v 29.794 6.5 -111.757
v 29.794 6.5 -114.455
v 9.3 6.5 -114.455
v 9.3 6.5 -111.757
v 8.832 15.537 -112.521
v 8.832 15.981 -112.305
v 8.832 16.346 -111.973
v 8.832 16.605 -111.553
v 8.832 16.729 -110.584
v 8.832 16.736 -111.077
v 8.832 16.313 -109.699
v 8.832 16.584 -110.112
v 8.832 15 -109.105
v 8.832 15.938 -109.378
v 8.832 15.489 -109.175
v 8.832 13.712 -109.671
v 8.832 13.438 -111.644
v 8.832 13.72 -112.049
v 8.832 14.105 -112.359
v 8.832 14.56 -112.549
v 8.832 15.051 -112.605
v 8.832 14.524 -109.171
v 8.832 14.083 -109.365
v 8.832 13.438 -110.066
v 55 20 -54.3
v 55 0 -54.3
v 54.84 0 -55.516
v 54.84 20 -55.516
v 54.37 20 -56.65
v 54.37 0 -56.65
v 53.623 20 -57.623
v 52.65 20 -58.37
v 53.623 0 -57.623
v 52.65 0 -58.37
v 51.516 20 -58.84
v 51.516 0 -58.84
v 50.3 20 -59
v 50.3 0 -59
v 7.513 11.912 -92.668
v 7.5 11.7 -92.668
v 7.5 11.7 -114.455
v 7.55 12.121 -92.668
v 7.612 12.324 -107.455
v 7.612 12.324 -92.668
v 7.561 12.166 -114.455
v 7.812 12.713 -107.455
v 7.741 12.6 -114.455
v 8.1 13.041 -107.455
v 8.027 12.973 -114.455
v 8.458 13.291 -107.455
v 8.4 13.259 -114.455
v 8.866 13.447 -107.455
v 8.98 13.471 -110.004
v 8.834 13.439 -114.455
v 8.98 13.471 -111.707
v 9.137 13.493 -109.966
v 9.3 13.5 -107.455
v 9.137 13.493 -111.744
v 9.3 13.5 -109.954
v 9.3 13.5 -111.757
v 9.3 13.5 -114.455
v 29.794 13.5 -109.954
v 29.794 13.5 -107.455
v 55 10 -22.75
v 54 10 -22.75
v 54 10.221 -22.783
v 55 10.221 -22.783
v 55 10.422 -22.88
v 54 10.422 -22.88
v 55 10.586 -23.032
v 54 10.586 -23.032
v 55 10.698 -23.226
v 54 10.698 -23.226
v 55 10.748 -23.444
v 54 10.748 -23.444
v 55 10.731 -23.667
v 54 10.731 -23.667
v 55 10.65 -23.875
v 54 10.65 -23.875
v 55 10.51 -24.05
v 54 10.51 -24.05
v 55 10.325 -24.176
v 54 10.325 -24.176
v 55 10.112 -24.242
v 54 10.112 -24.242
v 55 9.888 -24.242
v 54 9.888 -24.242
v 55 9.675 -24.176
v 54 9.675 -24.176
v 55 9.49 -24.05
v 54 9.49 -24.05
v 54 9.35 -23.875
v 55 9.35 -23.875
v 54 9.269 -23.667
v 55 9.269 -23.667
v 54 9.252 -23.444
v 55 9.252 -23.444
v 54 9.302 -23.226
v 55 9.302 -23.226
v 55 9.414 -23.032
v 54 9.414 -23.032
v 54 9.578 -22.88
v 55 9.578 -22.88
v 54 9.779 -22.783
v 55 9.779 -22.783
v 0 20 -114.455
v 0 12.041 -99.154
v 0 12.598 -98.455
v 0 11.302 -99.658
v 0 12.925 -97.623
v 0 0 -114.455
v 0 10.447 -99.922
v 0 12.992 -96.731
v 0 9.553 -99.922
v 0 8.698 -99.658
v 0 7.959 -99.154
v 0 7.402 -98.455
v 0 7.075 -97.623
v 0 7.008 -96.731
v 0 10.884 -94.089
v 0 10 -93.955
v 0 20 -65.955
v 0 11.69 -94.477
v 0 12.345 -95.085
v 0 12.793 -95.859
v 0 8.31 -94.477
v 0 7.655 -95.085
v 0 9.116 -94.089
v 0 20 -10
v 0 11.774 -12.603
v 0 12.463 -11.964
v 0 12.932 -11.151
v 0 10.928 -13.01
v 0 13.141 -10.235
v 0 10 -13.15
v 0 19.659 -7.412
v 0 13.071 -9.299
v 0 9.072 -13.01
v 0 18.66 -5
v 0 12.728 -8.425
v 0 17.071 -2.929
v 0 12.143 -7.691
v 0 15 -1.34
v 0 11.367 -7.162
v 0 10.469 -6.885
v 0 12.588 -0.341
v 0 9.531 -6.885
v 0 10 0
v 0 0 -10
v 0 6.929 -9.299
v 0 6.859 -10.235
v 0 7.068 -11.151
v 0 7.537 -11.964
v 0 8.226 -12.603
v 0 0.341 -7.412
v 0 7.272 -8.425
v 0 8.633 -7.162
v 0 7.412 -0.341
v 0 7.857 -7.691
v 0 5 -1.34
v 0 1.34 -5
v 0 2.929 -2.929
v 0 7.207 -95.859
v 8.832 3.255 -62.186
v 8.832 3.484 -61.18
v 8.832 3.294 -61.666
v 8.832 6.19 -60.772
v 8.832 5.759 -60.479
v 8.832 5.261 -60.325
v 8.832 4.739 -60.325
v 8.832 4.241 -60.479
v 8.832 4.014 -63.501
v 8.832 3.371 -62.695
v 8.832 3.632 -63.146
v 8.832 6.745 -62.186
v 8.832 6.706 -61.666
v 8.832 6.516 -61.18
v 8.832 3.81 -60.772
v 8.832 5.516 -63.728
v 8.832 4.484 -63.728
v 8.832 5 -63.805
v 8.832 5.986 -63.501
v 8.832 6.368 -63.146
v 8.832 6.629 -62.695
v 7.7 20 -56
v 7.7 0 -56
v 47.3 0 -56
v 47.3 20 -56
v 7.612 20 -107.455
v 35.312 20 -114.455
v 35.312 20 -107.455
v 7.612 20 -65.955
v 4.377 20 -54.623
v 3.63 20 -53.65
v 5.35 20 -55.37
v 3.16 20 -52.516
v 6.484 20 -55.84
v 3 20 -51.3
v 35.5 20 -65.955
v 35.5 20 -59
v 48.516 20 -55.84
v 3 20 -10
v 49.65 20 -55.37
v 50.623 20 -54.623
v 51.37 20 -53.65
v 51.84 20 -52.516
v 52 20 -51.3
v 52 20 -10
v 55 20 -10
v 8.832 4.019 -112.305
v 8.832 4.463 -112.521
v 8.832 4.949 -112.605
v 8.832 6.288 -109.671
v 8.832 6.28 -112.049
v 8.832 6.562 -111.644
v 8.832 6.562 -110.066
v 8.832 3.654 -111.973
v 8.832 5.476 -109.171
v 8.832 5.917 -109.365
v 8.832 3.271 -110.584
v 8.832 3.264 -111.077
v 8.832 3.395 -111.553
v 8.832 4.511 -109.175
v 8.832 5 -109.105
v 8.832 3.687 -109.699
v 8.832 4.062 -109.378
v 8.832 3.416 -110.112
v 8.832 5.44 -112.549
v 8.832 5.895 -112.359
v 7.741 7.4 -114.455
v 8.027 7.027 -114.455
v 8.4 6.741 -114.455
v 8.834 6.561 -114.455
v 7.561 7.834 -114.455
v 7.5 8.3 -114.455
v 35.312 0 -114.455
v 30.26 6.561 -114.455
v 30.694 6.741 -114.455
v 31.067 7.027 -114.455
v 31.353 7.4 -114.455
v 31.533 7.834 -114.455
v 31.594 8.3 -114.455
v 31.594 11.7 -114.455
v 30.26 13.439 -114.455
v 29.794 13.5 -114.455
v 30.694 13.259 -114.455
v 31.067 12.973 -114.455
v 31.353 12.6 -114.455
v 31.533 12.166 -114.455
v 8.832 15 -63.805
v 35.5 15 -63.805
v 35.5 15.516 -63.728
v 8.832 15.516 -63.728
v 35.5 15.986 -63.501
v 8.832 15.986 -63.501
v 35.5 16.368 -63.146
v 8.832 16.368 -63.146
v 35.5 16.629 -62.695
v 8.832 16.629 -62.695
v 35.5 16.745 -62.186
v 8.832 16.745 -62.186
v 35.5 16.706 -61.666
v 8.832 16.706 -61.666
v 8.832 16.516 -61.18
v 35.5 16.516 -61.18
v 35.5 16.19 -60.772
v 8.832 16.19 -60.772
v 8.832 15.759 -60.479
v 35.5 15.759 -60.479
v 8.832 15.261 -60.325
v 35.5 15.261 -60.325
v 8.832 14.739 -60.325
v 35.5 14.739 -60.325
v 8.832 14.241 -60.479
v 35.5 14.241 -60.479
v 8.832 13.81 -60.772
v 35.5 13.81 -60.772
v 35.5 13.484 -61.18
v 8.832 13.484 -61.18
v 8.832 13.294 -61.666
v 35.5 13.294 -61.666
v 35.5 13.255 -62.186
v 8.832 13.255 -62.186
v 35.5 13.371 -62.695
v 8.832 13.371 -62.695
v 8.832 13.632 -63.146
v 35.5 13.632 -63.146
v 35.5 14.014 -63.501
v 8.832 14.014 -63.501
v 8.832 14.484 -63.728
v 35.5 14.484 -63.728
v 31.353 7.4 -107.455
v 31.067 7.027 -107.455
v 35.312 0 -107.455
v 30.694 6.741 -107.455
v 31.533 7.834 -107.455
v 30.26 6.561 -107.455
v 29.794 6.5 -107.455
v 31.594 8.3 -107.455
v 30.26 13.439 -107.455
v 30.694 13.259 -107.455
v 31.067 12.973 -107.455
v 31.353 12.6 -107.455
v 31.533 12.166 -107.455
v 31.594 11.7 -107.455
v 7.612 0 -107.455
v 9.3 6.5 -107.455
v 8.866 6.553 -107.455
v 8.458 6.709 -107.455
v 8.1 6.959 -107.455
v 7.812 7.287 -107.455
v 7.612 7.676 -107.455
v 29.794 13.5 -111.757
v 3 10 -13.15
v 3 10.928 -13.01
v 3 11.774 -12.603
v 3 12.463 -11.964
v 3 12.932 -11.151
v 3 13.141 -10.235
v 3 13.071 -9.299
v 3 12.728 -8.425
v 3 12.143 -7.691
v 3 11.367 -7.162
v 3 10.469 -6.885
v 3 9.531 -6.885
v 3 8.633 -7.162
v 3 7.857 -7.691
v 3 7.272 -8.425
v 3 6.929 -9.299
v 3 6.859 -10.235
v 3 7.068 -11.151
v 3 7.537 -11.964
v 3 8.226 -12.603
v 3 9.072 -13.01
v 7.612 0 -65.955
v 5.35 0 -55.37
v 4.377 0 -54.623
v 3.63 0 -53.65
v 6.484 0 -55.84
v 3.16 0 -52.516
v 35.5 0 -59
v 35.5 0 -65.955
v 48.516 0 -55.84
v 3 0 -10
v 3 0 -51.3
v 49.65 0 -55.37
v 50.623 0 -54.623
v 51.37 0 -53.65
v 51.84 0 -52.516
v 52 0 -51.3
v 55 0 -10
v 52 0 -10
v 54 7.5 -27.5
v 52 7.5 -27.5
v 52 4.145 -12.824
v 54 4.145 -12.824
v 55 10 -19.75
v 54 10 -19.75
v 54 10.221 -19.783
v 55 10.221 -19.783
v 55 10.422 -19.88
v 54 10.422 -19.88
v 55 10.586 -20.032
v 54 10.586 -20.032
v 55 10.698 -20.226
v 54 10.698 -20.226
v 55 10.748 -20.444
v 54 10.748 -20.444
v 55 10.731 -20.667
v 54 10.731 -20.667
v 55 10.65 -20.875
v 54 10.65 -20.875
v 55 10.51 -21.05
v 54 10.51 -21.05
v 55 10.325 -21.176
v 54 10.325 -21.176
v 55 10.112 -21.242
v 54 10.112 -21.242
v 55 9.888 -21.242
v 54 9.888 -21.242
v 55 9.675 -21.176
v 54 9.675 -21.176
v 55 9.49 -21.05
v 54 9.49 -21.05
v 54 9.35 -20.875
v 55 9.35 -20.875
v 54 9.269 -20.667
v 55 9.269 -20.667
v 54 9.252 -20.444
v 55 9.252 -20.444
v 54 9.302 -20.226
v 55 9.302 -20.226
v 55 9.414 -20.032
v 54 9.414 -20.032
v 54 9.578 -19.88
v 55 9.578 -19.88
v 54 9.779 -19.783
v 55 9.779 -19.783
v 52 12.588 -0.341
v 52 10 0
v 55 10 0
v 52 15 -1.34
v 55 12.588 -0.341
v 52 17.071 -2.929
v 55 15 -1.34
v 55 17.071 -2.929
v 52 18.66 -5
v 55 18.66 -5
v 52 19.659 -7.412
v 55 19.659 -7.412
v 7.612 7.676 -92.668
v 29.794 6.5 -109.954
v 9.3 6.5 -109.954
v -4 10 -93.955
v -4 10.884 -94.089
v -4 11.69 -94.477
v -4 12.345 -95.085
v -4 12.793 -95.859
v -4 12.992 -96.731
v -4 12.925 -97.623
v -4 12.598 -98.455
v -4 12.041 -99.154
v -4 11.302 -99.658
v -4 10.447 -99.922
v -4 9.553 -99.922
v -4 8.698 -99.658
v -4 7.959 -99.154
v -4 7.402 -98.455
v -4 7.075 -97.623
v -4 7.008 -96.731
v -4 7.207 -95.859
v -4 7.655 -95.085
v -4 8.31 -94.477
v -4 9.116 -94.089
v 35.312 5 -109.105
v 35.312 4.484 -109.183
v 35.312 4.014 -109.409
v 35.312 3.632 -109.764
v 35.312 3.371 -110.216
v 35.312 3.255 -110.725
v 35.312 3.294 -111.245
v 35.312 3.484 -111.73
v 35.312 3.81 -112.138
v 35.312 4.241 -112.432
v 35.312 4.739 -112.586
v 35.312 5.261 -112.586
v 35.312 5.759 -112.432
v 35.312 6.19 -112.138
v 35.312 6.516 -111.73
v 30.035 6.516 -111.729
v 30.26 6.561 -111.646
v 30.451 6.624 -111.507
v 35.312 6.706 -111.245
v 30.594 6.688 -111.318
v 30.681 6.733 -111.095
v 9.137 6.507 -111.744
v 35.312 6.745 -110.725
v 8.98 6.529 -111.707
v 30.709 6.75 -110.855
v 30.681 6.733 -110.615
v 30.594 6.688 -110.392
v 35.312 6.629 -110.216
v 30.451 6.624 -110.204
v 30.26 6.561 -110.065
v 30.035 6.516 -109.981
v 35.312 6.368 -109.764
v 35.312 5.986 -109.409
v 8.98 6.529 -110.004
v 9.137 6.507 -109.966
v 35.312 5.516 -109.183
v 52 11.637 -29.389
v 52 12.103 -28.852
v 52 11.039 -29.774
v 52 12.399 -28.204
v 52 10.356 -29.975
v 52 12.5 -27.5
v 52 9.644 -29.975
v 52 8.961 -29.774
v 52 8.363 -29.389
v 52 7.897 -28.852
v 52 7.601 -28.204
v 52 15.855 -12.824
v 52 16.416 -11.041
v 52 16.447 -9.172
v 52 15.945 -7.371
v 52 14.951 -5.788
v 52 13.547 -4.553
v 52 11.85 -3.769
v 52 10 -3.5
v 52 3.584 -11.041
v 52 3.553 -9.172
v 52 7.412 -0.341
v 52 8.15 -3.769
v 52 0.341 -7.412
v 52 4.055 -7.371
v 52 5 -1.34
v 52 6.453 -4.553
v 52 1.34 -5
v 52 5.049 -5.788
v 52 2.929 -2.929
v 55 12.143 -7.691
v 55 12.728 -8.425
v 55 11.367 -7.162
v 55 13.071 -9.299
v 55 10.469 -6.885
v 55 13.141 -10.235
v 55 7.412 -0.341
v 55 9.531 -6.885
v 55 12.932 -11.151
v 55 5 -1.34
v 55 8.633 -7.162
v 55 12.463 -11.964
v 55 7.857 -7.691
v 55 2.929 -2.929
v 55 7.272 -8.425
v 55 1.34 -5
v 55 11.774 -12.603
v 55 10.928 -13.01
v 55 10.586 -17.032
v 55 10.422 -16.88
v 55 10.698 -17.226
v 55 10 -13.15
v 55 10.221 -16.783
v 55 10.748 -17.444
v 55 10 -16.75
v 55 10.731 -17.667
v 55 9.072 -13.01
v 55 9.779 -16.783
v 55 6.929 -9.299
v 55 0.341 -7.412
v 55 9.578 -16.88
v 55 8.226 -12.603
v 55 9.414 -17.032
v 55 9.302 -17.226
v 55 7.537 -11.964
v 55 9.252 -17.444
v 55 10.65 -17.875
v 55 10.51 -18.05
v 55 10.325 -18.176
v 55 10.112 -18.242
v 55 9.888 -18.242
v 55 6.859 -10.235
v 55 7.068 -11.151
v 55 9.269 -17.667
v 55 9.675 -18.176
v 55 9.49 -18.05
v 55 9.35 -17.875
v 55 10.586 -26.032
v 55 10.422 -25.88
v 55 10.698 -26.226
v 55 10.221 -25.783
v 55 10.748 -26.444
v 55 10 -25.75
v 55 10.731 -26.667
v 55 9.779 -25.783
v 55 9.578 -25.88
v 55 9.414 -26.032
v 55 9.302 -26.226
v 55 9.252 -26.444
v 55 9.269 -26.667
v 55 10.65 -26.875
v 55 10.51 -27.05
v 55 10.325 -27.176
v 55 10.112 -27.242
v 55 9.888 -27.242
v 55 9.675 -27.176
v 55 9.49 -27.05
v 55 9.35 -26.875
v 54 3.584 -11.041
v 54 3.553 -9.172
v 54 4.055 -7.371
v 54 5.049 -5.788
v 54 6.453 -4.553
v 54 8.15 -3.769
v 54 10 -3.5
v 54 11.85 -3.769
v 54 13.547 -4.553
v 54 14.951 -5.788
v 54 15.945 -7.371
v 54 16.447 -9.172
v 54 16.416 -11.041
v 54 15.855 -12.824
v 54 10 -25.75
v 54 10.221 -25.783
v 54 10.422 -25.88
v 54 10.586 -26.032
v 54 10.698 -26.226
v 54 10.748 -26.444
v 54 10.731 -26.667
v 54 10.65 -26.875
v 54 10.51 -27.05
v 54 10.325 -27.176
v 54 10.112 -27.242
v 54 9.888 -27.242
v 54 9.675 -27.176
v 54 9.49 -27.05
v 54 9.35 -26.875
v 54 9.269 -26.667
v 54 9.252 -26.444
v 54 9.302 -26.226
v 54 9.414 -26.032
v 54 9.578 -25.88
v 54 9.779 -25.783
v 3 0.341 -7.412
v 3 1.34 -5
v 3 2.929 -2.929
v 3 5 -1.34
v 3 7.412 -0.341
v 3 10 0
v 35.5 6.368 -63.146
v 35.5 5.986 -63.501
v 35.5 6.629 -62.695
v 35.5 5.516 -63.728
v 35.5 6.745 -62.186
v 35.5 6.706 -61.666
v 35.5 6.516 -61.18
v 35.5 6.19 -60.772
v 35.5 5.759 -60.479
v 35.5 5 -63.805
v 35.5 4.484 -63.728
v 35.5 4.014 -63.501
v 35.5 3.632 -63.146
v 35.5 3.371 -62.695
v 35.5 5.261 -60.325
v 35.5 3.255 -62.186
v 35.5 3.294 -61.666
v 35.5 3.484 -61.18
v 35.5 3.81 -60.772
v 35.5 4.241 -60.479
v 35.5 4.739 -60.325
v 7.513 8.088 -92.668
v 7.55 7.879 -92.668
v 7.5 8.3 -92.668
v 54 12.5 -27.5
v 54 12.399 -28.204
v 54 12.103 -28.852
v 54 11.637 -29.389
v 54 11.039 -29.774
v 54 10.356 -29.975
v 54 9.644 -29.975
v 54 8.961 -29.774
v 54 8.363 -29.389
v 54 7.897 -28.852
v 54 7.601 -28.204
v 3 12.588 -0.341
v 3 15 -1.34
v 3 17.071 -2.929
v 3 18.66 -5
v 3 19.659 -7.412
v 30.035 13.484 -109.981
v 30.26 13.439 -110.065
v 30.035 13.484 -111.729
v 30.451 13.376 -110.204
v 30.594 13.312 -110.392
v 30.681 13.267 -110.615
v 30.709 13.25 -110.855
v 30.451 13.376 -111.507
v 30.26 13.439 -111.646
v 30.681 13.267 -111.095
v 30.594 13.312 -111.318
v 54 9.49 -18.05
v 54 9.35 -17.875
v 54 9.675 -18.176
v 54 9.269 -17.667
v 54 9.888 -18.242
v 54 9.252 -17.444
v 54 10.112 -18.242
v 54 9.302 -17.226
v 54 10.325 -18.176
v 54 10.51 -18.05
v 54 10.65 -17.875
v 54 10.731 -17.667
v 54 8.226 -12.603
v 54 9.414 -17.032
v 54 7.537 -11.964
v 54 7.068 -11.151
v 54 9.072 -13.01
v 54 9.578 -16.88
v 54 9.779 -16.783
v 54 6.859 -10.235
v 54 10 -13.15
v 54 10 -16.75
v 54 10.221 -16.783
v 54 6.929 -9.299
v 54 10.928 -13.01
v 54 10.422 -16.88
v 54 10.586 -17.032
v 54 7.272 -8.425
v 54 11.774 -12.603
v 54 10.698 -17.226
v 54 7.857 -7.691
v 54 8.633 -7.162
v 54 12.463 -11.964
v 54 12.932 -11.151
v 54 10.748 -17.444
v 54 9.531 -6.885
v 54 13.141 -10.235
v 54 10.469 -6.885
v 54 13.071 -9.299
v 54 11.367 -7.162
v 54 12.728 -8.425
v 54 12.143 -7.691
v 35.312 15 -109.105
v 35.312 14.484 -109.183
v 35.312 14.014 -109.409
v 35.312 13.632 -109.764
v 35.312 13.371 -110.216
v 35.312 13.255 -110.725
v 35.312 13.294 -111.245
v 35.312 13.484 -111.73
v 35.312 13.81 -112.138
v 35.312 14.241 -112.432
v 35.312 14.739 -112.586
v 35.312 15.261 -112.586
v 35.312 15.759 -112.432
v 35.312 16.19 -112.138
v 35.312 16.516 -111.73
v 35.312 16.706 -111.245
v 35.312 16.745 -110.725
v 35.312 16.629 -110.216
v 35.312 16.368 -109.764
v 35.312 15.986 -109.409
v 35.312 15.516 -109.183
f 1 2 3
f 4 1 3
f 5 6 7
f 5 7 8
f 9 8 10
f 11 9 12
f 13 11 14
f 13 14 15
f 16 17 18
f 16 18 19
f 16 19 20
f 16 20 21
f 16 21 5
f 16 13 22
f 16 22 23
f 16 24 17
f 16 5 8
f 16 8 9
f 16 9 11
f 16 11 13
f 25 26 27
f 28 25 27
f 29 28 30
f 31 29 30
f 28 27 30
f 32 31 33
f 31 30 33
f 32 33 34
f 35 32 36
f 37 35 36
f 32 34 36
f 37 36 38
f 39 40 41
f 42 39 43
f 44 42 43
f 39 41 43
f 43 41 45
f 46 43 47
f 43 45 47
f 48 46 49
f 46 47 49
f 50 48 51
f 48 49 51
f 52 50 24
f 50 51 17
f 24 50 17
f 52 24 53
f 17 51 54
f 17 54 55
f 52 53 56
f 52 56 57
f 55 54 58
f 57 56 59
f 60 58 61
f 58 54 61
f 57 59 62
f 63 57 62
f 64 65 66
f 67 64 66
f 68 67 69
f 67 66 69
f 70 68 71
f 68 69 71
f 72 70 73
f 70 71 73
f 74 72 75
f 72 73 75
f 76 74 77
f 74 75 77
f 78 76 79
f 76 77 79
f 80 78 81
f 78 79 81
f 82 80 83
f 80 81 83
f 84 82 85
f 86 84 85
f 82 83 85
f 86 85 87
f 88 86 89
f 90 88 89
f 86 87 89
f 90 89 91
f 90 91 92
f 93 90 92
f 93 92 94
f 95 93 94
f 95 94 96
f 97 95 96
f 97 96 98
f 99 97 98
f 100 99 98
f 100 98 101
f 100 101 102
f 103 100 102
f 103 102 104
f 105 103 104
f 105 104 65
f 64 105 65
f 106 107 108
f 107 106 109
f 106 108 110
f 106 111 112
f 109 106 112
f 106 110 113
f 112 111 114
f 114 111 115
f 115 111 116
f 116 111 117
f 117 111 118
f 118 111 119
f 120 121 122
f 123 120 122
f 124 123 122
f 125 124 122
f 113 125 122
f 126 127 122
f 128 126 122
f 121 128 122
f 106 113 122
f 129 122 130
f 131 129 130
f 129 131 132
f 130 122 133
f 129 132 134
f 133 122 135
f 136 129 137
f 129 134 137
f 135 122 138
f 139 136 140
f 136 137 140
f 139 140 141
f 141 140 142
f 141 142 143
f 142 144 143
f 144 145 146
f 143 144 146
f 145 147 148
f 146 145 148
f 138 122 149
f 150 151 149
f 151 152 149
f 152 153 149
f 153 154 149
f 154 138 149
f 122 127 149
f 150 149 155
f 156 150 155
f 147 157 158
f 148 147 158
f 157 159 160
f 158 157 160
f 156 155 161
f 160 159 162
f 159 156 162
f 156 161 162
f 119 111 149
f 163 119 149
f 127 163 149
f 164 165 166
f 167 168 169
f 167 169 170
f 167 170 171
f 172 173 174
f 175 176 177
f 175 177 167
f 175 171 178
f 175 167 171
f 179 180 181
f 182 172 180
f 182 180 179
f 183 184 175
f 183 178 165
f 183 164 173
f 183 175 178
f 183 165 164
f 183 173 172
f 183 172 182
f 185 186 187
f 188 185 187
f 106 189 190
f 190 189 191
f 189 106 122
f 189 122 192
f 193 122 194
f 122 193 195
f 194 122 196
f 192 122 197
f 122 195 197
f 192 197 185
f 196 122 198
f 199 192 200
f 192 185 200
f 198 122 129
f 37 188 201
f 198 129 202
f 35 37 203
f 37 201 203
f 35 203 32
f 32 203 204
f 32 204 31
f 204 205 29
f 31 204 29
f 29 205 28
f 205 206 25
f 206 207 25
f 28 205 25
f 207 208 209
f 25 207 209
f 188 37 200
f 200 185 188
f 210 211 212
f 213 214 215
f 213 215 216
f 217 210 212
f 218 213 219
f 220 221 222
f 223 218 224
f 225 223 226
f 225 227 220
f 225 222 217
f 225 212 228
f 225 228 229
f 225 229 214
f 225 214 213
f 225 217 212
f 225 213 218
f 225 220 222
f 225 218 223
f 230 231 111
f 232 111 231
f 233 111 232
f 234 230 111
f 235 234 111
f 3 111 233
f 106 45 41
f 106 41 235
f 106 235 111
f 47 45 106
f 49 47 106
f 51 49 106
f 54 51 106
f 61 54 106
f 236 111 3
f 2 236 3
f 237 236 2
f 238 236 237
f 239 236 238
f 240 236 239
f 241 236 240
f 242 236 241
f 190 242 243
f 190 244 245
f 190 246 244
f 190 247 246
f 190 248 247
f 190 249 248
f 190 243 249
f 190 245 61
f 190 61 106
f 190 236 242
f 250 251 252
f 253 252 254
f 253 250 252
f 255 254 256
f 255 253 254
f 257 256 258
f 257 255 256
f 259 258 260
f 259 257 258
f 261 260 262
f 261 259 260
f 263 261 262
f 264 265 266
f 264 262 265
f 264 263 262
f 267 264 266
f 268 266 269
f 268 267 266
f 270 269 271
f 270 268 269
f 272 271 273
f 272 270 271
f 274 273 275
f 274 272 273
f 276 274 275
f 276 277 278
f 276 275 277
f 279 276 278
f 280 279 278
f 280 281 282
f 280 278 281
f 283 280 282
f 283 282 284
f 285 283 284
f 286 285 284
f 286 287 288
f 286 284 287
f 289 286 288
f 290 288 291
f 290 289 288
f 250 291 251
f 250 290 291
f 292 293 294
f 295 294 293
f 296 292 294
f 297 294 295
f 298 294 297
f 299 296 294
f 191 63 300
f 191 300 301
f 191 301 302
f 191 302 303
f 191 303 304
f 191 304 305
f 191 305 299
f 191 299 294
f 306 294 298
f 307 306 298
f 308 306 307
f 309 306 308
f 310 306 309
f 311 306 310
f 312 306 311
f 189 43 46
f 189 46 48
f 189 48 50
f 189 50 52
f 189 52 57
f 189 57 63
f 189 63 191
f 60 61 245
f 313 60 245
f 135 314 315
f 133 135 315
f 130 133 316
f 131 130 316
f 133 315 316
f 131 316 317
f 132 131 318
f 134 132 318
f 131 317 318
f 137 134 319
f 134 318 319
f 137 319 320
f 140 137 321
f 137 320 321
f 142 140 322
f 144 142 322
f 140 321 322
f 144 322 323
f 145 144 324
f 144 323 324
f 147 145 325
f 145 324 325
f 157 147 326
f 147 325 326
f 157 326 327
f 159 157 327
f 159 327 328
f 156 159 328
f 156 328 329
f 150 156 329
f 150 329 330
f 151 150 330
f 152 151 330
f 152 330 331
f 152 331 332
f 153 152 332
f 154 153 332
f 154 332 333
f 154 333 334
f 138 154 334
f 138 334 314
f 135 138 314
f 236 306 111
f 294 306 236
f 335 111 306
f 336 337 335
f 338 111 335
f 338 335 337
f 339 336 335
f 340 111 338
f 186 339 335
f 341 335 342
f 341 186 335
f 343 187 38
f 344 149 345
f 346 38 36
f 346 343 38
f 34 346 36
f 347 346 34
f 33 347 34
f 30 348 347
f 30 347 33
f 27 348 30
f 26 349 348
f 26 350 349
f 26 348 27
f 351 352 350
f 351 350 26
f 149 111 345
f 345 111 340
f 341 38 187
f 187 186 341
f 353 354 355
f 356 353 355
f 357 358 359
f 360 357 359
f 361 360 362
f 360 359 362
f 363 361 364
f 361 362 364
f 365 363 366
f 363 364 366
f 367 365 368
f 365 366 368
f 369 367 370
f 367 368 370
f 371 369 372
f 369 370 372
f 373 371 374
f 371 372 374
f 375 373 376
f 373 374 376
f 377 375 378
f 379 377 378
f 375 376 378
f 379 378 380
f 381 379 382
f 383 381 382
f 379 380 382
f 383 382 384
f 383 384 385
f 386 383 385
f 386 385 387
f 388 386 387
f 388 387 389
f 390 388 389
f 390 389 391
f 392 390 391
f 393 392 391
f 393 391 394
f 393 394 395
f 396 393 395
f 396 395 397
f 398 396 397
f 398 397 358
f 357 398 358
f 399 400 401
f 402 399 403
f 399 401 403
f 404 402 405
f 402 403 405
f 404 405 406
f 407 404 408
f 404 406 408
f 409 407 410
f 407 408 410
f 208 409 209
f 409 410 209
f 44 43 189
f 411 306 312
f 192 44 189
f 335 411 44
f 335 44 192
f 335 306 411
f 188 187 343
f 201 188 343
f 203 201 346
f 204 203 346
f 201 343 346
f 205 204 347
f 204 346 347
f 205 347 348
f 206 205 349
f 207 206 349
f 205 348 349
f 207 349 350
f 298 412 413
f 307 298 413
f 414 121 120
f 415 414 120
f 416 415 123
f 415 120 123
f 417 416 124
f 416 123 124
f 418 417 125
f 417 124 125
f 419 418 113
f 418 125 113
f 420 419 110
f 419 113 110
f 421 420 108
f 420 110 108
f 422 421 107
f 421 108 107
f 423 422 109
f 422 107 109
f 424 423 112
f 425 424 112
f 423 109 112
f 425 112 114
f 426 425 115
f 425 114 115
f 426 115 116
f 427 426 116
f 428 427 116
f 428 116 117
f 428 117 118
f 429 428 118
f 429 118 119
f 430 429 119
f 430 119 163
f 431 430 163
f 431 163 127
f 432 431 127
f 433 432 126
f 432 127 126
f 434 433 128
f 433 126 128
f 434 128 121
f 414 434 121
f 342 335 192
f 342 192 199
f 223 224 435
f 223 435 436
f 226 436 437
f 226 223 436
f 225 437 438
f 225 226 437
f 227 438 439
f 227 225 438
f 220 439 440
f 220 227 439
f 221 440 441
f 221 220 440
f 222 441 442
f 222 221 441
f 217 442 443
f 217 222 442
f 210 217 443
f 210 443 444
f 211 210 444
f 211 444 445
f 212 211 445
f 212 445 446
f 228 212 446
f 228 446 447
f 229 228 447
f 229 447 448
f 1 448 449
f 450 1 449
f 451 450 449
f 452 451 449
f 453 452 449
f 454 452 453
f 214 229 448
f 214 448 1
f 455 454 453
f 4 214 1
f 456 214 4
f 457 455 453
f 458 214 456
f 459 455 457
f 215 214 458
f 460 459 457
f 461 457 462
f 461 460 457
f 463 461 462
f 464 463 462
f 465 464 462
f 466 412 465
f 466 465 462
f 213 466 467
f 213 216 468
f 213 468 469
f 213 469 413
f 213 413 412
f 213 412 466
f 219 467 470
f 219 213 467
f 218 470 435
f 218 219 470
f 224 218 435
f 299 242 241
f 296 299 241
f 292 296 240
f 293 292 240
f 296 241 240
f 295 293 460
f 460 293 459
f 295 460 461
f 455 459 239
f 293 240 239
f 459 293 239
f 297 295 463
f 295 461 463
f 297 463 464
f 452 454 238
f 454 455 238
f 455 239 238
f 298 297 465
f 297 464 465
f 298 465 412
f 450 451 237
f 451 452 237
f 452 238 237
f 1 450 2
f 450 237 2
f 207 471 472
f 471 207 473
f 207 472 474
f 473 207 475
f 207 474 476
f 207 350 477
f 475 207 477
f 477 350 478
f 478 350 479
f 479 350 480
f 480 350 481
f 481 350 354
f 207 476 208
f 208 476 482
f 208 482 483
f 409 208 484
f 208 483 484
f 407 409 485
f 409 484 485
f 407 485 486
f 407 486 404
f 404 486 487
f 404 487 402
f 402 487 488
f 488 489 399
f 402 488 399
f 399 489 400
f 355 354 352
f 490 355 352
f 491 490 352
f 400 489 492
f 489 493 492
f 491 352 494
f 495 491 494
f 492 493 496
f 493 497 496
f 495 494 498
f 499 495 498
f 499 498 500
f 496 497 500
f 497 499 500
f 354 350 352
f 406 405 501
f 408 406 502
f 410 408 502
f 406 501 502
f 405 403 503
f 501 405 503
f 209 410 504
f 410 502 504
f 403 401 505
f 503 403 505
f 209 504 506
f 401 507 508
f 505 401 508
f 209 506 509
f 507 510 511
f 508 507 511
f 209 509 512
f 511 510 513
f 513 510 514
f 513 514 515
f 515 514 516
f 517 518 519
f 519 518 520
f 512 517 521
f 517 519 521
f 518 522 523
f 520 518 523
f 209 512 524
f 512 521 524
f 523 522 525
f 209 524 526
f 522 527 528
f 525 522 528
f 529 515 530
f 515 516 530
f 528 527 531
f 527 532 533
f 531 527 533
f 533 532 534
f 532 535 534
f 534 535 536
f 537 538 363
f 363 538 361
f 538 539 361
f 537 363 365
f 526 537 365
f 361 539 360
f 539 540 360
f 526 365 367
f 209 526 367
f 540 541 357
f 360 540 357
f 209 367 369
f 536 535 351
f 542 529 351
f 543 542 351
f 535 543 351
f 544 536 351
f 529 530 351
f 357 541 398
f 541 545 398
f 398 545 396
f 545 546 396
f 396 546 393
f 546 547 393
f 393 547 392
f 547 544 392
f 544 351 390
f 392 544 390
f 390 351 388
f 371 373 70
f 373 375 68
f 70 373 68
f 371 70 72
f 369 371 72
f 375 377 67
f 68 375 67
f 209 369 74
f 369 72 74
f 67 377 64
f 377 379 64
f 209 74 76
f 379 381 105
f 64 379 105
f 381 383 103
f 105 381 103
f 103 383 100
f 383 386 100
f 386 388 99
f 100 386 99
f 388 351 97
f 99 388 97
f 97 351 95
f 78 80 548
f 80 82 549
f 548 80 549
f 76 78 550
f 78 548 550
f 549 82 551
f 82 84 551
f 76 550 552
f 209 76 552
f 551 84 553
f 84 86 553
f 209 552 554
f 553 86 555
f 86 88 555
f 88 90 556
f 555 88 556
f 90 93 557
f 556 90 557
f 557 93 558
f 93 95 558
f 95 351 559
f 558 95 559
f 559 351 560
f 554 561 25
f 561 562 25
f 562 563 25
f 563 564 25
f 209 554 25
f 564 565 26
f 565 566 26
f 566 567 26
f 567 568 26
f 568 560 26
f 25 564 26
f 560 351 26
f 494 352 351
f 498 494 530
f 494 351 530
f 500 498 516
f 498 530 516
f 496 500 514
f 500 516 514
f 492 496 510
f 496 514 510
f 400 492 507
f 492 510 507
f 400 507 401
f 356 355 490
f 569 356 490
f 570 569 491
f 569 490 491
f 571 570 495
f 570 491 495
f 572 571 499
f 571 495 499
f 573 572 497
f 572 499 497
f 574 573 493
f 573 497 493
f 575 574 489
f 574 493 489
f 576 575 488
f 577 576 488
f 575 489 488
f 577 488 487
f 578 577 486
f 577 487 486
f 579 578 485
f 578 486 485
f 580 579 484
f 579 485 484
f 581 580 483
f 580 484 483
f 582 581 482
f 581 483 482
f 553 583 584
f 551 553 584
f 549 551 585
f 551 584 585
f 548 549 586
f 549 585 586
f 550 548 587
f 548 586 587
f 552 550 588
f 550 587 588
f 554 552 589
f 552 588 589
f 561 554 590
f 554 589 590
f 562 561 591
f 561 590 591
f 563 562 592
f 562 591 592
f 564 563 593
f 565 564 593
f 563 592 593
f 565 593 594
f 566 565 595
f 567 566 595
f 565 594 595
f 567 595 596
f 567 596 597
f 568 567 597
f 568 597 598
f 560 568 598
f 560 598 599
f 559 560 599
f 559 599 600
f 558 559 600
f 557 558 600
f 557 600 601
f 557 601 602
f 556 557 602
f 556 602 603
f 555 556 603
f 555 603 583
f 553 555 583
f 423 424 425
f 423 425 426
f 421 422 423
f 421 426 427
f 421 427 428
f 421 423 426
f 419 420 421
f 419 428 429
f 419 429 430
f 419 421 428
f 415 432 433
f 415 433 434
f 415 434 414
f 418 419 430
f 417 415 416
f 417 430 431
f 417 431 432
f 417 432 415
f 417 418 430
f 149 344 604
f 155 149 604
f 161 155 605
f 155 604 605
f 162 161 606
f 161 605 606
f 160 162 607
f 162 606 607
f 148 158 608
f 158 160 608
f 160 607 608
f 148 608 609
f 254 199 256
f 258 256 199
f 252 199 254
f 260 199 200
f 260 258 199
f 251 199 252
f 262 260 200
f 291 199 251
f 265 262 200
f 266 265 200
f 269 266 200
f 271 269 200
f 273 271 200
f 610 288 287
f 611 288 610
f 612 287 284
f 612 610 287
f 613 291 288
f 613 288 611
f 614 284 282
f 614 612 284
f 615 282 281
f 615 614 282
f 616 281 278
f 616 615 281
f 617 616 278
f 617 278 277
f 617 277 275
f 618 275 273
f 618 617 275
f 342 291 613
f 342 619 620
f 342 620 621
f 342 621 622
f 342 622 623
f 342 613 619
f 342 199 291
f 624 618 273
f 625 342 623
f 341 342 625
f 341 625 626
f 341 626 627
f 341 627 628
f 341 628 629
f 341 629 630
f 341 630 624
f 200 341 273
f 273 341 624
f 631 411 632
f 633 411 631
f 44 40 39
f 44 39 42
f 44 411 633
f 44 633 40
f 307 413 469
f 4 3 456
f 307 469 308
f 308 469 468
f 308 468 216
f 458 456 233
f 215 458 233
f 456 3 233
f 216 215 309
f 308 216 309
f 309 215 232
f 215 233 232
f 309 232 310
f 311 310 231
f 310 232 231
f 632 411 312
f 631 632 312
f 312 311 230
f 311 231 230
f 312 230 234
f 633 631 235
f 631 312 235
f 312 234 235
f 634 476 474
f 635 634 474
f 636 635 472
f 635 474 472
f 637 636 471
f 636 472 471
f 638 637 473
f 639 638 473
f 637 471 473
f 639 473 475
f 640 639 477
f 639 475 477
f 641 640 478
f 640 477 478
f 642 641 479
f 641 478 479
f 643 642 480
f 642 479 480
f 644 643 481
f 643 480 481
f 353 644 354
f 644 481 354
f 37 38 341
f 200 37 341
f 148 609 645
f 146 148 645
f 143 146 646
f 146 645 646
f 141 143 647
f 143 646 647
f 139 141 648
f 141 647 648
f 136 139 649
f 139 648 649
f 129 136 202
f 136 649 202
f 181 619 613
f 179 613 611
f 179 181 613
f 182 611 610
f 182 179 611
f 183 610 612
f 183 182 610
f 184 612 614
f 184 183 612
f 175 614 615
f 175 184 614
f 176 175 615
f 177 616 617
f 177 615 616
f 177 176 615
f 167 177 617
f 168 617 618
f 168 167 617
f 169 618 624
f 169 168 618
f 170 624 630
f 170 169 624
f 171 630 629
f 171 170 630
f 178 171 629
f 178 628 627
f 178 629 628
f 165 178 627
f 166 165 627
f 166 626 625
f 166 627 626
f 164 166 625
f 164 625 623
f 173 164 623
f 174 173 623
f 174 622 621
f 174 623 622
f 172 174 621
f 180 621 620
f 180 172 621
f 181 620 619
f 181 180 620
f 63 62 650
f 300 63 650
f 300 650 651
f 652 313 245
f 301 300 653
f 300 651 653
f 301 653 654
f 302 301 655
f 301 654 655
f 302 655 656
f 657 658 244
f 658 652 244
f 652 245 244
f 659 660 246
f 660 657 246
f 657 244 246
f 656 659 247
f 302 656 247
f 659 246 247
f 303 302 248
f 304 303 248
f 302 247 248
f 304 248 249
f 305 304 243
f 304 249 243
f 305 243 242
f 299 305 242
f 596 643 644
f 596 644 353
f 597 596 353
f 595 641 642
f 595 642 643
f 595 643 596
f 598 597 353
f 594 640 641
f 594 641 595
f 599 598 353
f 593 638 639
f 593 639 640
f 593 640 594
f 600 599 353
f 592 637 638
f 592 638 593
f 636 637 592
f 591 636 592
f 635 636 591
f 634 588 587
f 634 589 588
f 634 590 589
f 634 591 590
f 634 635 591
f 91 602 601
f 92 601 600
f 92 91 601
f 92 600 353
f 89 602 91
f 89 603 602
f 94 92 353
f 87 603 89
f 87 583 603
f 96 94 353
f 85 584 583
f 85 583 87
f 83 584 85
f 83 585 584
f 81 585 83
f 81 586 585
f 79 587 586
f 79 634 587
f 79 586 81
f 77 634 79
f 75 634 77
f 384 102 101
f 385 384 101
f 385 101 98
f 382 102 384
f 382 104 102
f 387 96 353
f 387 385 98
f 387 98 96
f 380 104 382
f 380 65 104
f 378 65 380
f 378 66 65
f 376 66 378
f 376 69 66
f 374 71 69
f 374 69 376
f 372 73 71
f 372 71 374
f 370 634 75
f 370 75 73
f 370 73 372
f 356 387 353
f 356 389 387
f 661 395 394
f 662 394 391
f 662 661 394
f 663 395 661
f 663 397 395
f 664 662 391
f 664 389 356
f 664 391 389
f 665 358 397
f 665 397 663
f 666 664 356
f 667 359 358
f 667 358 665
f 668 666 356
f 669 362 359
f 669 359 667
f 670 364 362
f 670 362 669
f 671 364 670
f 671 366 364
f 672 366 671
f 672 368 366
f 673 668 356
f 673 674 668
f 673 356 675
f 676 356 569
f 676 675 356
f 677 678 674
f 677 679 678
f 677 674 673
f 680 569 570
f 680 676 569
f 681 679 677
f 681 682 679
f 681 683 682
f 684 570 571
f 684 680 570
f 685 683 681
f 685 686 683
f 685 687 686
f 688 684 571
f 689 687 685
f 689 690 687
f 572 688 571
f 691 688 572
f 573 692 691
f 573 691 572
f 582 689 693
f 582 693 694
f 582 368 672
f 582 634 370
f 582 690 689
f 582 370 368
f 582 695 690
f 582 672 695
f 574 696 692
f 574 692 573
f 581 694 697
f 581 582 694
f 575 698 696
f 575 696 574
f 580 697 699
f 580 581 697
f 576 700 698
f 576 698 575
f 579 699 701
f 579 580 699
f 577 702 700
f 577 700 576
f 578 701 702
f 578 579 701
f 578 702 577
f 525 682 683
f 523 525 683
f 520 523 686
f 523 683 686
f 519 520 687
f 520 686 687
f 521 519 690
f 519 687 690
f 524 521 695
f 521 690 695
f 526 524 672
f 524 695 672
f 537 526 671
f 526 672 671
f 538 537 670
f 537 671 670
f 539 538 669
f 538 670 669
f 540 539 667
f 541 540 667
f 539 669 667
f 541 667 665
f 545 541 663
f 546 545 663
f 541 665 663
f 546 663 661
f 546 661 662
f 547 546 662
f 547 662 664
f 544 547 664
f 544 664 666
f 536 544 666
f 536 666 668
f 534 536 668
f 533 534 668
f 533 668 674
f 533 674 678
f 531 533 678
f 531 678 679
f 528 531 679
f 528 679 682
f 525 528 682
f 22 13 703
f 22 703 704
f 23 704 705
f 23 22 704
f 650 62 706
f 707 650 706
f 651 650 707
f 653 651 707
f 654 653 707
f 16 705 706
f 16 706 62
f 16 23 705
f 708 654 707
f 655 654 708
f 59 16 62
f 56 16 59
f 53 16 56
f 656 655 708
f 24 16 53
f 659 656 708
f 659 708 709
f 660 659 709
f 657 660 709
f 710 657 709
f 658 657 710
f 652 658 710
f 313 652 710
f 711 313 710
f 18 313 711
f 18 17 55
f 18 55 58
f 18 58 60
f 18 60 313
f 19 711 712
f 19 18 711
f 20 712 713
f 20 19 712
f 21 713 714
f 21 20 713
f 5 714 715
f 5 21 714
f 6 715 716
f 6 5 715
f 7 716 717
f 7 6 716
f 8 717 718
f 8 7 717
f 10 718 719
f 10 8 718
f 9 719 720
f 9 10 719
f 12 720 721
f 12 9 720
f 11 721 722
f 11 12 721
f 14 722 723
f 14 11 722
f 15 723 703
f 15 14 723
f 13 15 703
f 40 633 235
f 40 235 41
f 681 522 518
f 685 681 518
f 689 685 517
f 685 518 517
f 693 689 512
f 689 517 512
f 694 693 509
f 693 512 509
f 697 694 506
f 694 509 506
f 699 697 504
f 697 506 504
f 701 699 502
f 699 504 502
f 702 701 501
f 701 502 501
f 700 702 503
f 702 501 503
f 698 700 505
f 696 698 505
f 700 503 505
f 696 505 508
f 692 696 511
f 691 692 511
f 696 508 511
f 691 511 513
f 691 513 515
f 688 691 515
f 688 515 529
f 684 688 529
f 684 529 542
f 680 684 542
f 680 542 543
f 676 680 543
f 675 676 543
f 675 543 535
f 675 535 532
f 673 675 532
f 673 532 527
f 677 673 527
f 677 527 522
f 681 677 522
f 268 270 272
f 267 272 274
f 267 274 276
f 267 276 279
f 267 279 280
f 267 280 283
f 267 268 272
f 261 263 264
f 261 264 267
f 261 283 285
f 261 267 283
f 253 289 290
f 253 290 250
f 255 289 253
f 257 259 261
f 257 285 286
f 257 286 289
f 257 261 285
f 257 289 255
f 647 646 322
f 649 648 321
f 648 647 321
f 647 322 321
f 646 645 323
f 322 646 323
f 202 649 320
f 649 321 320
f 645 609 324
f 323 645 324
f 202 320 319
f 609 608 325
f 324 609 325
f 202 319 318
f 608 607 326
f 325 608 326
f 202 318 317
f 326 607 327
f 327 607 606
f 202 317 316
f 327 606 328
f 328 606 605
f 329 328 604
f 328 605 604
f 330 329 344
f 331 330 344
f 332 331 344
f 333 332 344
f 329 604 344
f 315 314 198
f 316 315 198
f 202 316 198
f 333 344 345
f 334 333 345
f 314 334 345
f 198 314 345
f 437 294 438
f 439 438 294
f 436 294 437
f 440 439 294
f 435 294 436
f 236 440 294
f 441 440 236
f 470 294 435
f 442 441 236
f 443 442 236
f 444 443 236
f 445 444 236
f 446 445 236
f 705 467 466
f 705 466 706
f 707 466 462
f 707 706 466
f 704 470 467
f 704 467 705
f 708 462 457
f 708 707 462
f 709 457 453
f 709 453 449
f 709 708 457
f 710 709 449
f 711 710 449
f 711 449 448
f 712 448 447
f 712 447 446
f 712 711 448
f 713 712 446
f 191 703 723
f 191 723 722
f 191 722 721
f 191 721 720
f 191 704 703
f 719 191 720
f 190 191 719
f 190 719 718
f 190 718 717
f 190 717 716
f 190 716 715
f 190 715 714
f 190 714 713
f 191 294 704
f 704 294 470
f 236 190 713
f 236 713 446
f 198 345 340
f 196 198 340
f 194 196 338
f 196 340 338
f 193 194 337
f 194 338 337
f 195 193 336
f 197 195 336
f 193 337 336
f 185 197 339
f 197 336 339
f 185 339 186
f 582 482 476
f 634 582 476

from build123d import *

# Parameters (mm, degrees)
AUFSATZ_LINEAR_AUSTRAGEN1_DEPTH      = 20
SCHNITT_LINEAR_AUSTRAGEN1_DEPTH      = 84.102346537
SKIZZE3_R                            = 3.15
SCHNITT_LINEAR_AUSTRAGEN2_DEPTH      = 84.102346537
SCHNITT_LINEAR_AUSTRAGEN3_DEPTH      = 2
SKIZZE5_R                            = 0.75
SCHNITT_LINEAR_AUSTRAGEN4_DEPTH      = 2
SKIZZE6_W                            = 35.5
SKIZZE6_H                            = 6.955295524
AUFSATZ_LINEAR_AUSTRAGEN2_DEPTH      = 20
SKIZZE7_W                            = 7.611739691
SKIZZE7_H                            = 53.192525908
AUFSATZ_LINEAR_AUSTRAGEN3_DEPTH      = 20
SKIZZE8_W                            = 7
SKIZZE8_H                            = 20
AUFSATZ_LINEAR_AUSTRAGEN4_DEPTH      = 27.7
SCHNITT_LINEAR_AUSTRAGEN5_DEPTH      = 26.48
SCHNITT_LINEAR_AUSTRAGEN6_DEPTH      = 6
SCHNITT_LINEAR_AUSTRAGEN6_DEPTH_BACK = 26.48
SKIZZE10_R                           = 1.75
SKIZZE11_R                           = 3
AUFSATZ_LINEAR_AUSTRAGEN5_DEPTH      = 4
SKIZZE12_W                           = 4.692525908
SKIZZE12_H                           = 20
SCHNITT_LINEAR_AUSTRAGEN7_DEPTH      = 130.77615571


with BuildPart() as part:
    # Skizze1 → Aufsatz-Linear austragen1 (new body)
    with BuildSketch(Plane(origin=(0, 0, 0), x_dir=(1, 0, 0), z_dir=(0, 1, 0))):
        with BuildLine():
            Line((0, 59), (0, 0))
            Line((0, 0), (3, 0))
            Line((3, 0), (3, 51.3))
            ThreePointArc((3, 51.3), (4.376598128, 54.623401872), (7.7, 56))
            Line((7.7, 56), (47.3, 56))
            ThreePointArc((47.3, 56), (50.623401872, 54.623401872), (52, 51.3))
            Line((52, 51.3), (52, 0))
            Line((52, 0), (55, 0))
            Line((55, 0), (55, 54.3))
            ThreePointArc((55, 54.3), (53.623401872, 57.623401872), (50.3, 59))
            Line((50.3, 59), (0, 59))
        make_face()
    extrude(amount=AUFSATZ_LINEAR_AUSTRAGEN1_DEPTH)

    # Skizze2 → Schnitt-Linear austragen1 (cut, through all)
    with BuildSketch(Plane(origin=(55, 0, 0), x_dir=(0, 0, -1), z_dir=(1, 0, 0))):
        with BuildLine():
            ThreePointArc((0, 10), (2.928932188, 17.071067812), (10, 20))
            Line((10, 20), (0, 20))
            Line((0, 20), (0, 10))
        make_face()
        with BuildLine():
            ThreePointArc((10, 0), (2.928932188, 2.928932188), (0, 10))
            Line((0, 10), (0, 0))
            Line((0, 0), (10, 0))
        make_face()
    extrude(amount=-SCHNITT_LINEAR_AUSTRAGEN1_DEPTH, mode=Mode.SUBTRACT)

    # Skizze3 → Schnitt-Linear austragen2 (cut, through all)
    with BuildSketch(Plane(origin=(55, 0, 0), x_dir=(0, 0, -1), z_dir=(1, 0, 0))):
        with Locations((10, 10)):
            Circle(SKIZZE3_R)
    extrude(amount=-SCHNITT_LINEAR_AUSTRAGEN2_DEPTH, mode=Mode.SUBTRACT)

    # Skizze4 → Schnitt-Linear austragen3 (cut)
    with BuildSketch(Plane.ZY.offset(-52)):
        with BuildLine():
            Line((-27.5, 7.5), (-12.823894492, 4.145461598))
            ThreePointArc((-12.823894492, 4.145461598), (-3.5, 10), (-12.823894492, 15.854538402))
            Line((-12.823894492, 15.854538402), (-27.5, 12.5))
            ThreePointArc((-27.5, 12.5), (-30, 10), (-27.5, 7.5))
        make_face()
    extrude(amount=-SCHNITT_LINEAR_AUSTRAGEN3_DEPTH, mode=Mode.SUBTRACT)

    # Skizze5 → Schnitt-Linear austragen4 (cut)
    with BuildSketch(Plane.ZY.offset(-54)):
        with Locations((-26.5, 10)):
            Circle(SKIZZE5_R)
        with Locations((-23.5, 10)):
            Circle(SKIZZE5_R)
        with Locations((-20.5, 10)):
            Circle(SKIZZE5_R)
        with Locations((-17.5, 10)):
            Circle(SKIZZE5_R)
    extrude(amount=-SCHNITT_LINEAR_AUSTRAGEN4_DEPTH, mode=Mode.SUBTRACT)

    # Skizze6 → Aufsatz-Linear austragen2 (add)
    with BuildSketch(Plane.XZ):
        with Locations((17.75, -62.477647762)):
            Rectangle(SKIZZE6_W, SKIZZE6_H)
    extrude(amount=-AUFSATZ_LINEAR_AUSTRAGEN2_DEPTH)

    # Skizze7 → Aufsatz-Linear austragen3 (add)
    with BuildSketch(Plane.XZ):
        with Locations((3.805869846, -92.551558478)):
            Rectangle(SKIZZE7_W, SKIZZE7_H)
    extrude(amount=-AUFSATZ_LINEAR_AUSTRAGEN3_DEPTH)

    # Skizze8 → Aufsatz-Linear austragen4 (add)
    with BuildSketch(Plane(origin=(7.611739691, 0, 0), x_dir=(0, 0, -1), z_dir=(1, 0, 0))):
        with Locations((110.955295524, 10)):
            Rectangle(SKIZZE8_W, SKIZZE8_H)
    extrude(amount=AUFSATZ_LINEAR_AUSTRAGEN4_DEPTH)

    # Skizze9 → Schnitt-Linear austragen5 (cut)
    with BuildSketch(Plane(origin=(0, 0, -119.147821432), x_dir=(-1, 0, 0), z_dir=(0, 0, -1))):
        with BuildLine():
            Line((-9.3, 13.5), (-29.794038703, 13.5))
            ThreePointArc((-29.794038703, 13.5), (-31.066830909, 12.972792206), (-31.594038703, 11.7))
            Line((-31.594038703, 11.7), (-31.594038703, 8.3))
            ThreePointArc((-31.594038703, 8.3), (-31.066830909, 7.027207794), (-29.794038703, 6.5))
            Line((-29.794038703, 6.5), (-9.3, 6.5))
            ThreePointArc((-9.3, 6.5), (-8.027207794, 7.027207794), (-7.5, 8.3))
            Line((-7.5, 8.3), (-7.5, 11.7))
            ThreePointArc((-7.5, 11.7), (-8.027207794, 12.972792206), (-9.3, 13.5))
        make_face()
    extrude(amount=-SCHNITT_LINEAR_AUSTRAGEN5_DEPTH, mode=Mode.SUBTRACT)

    # Skizze10 → Schnitt-Linear austragen6 (cut, two sides: drawn at the far end of the back side and taken through both)
    with BuildSketch(Plane(origin=(35.311739691, 0, 0), x_dir=(0, 0, -1), z_dir=(1, 0, 0)).offset(-SCHNITT_LINEAR_AUSTRAGEN6_DEPTH_BACK)):
        with Locations((62.055295524, 15)):
            Circle(SKIZZE10_R)
        with Locations((62.055295524, 5)):
            Circle(SKIZZE10_R)
        with Locations(Location((110.855295524, 5, 0), (0, 0, 180))):
            Circle(SKIZZE10_R)
        with Locations(Location((110.855295524, 15, 0), (0, 0, 180))):
            Circle(SKIZZE10_R)
    extrude(amount=SCHNITT_LINEAR_AUSTRAGEN6_DEPTH + SCHNITT_LINEAR_AUSTRAGEN6_DEPTH_BACK, mode=Mode.SUBTRACT)

    # Skizze11 → Aufsatz-Linear austragen5 (add)
    with BuildSketch(Plane.ZY):
        with Locations((-96.955295524, 10)):
            Circle(SKIZZE11_R)
    extrude(amount=AUFSATZ_LINEAR_AUSTRAGEN5_DEPTH)

    # Skizze12 → Schnitt-Linear austragen7 (cut, through all)
    with BuildSketch(Plane(origin=(7.611739691, 0, 0), x_dir=(0, 0, -1), z_dir=(1, 0, 0))):
        with Locations((116.801558478, 10)):
            Rectangle(SKIZZE12_W, SKIZZE12_H)
    extrude(amount=-SCHNITT_LINEAR_AUSTRAGEN7_DEPTH, mode=Mode.SUBTRACT)


solid = part.part
